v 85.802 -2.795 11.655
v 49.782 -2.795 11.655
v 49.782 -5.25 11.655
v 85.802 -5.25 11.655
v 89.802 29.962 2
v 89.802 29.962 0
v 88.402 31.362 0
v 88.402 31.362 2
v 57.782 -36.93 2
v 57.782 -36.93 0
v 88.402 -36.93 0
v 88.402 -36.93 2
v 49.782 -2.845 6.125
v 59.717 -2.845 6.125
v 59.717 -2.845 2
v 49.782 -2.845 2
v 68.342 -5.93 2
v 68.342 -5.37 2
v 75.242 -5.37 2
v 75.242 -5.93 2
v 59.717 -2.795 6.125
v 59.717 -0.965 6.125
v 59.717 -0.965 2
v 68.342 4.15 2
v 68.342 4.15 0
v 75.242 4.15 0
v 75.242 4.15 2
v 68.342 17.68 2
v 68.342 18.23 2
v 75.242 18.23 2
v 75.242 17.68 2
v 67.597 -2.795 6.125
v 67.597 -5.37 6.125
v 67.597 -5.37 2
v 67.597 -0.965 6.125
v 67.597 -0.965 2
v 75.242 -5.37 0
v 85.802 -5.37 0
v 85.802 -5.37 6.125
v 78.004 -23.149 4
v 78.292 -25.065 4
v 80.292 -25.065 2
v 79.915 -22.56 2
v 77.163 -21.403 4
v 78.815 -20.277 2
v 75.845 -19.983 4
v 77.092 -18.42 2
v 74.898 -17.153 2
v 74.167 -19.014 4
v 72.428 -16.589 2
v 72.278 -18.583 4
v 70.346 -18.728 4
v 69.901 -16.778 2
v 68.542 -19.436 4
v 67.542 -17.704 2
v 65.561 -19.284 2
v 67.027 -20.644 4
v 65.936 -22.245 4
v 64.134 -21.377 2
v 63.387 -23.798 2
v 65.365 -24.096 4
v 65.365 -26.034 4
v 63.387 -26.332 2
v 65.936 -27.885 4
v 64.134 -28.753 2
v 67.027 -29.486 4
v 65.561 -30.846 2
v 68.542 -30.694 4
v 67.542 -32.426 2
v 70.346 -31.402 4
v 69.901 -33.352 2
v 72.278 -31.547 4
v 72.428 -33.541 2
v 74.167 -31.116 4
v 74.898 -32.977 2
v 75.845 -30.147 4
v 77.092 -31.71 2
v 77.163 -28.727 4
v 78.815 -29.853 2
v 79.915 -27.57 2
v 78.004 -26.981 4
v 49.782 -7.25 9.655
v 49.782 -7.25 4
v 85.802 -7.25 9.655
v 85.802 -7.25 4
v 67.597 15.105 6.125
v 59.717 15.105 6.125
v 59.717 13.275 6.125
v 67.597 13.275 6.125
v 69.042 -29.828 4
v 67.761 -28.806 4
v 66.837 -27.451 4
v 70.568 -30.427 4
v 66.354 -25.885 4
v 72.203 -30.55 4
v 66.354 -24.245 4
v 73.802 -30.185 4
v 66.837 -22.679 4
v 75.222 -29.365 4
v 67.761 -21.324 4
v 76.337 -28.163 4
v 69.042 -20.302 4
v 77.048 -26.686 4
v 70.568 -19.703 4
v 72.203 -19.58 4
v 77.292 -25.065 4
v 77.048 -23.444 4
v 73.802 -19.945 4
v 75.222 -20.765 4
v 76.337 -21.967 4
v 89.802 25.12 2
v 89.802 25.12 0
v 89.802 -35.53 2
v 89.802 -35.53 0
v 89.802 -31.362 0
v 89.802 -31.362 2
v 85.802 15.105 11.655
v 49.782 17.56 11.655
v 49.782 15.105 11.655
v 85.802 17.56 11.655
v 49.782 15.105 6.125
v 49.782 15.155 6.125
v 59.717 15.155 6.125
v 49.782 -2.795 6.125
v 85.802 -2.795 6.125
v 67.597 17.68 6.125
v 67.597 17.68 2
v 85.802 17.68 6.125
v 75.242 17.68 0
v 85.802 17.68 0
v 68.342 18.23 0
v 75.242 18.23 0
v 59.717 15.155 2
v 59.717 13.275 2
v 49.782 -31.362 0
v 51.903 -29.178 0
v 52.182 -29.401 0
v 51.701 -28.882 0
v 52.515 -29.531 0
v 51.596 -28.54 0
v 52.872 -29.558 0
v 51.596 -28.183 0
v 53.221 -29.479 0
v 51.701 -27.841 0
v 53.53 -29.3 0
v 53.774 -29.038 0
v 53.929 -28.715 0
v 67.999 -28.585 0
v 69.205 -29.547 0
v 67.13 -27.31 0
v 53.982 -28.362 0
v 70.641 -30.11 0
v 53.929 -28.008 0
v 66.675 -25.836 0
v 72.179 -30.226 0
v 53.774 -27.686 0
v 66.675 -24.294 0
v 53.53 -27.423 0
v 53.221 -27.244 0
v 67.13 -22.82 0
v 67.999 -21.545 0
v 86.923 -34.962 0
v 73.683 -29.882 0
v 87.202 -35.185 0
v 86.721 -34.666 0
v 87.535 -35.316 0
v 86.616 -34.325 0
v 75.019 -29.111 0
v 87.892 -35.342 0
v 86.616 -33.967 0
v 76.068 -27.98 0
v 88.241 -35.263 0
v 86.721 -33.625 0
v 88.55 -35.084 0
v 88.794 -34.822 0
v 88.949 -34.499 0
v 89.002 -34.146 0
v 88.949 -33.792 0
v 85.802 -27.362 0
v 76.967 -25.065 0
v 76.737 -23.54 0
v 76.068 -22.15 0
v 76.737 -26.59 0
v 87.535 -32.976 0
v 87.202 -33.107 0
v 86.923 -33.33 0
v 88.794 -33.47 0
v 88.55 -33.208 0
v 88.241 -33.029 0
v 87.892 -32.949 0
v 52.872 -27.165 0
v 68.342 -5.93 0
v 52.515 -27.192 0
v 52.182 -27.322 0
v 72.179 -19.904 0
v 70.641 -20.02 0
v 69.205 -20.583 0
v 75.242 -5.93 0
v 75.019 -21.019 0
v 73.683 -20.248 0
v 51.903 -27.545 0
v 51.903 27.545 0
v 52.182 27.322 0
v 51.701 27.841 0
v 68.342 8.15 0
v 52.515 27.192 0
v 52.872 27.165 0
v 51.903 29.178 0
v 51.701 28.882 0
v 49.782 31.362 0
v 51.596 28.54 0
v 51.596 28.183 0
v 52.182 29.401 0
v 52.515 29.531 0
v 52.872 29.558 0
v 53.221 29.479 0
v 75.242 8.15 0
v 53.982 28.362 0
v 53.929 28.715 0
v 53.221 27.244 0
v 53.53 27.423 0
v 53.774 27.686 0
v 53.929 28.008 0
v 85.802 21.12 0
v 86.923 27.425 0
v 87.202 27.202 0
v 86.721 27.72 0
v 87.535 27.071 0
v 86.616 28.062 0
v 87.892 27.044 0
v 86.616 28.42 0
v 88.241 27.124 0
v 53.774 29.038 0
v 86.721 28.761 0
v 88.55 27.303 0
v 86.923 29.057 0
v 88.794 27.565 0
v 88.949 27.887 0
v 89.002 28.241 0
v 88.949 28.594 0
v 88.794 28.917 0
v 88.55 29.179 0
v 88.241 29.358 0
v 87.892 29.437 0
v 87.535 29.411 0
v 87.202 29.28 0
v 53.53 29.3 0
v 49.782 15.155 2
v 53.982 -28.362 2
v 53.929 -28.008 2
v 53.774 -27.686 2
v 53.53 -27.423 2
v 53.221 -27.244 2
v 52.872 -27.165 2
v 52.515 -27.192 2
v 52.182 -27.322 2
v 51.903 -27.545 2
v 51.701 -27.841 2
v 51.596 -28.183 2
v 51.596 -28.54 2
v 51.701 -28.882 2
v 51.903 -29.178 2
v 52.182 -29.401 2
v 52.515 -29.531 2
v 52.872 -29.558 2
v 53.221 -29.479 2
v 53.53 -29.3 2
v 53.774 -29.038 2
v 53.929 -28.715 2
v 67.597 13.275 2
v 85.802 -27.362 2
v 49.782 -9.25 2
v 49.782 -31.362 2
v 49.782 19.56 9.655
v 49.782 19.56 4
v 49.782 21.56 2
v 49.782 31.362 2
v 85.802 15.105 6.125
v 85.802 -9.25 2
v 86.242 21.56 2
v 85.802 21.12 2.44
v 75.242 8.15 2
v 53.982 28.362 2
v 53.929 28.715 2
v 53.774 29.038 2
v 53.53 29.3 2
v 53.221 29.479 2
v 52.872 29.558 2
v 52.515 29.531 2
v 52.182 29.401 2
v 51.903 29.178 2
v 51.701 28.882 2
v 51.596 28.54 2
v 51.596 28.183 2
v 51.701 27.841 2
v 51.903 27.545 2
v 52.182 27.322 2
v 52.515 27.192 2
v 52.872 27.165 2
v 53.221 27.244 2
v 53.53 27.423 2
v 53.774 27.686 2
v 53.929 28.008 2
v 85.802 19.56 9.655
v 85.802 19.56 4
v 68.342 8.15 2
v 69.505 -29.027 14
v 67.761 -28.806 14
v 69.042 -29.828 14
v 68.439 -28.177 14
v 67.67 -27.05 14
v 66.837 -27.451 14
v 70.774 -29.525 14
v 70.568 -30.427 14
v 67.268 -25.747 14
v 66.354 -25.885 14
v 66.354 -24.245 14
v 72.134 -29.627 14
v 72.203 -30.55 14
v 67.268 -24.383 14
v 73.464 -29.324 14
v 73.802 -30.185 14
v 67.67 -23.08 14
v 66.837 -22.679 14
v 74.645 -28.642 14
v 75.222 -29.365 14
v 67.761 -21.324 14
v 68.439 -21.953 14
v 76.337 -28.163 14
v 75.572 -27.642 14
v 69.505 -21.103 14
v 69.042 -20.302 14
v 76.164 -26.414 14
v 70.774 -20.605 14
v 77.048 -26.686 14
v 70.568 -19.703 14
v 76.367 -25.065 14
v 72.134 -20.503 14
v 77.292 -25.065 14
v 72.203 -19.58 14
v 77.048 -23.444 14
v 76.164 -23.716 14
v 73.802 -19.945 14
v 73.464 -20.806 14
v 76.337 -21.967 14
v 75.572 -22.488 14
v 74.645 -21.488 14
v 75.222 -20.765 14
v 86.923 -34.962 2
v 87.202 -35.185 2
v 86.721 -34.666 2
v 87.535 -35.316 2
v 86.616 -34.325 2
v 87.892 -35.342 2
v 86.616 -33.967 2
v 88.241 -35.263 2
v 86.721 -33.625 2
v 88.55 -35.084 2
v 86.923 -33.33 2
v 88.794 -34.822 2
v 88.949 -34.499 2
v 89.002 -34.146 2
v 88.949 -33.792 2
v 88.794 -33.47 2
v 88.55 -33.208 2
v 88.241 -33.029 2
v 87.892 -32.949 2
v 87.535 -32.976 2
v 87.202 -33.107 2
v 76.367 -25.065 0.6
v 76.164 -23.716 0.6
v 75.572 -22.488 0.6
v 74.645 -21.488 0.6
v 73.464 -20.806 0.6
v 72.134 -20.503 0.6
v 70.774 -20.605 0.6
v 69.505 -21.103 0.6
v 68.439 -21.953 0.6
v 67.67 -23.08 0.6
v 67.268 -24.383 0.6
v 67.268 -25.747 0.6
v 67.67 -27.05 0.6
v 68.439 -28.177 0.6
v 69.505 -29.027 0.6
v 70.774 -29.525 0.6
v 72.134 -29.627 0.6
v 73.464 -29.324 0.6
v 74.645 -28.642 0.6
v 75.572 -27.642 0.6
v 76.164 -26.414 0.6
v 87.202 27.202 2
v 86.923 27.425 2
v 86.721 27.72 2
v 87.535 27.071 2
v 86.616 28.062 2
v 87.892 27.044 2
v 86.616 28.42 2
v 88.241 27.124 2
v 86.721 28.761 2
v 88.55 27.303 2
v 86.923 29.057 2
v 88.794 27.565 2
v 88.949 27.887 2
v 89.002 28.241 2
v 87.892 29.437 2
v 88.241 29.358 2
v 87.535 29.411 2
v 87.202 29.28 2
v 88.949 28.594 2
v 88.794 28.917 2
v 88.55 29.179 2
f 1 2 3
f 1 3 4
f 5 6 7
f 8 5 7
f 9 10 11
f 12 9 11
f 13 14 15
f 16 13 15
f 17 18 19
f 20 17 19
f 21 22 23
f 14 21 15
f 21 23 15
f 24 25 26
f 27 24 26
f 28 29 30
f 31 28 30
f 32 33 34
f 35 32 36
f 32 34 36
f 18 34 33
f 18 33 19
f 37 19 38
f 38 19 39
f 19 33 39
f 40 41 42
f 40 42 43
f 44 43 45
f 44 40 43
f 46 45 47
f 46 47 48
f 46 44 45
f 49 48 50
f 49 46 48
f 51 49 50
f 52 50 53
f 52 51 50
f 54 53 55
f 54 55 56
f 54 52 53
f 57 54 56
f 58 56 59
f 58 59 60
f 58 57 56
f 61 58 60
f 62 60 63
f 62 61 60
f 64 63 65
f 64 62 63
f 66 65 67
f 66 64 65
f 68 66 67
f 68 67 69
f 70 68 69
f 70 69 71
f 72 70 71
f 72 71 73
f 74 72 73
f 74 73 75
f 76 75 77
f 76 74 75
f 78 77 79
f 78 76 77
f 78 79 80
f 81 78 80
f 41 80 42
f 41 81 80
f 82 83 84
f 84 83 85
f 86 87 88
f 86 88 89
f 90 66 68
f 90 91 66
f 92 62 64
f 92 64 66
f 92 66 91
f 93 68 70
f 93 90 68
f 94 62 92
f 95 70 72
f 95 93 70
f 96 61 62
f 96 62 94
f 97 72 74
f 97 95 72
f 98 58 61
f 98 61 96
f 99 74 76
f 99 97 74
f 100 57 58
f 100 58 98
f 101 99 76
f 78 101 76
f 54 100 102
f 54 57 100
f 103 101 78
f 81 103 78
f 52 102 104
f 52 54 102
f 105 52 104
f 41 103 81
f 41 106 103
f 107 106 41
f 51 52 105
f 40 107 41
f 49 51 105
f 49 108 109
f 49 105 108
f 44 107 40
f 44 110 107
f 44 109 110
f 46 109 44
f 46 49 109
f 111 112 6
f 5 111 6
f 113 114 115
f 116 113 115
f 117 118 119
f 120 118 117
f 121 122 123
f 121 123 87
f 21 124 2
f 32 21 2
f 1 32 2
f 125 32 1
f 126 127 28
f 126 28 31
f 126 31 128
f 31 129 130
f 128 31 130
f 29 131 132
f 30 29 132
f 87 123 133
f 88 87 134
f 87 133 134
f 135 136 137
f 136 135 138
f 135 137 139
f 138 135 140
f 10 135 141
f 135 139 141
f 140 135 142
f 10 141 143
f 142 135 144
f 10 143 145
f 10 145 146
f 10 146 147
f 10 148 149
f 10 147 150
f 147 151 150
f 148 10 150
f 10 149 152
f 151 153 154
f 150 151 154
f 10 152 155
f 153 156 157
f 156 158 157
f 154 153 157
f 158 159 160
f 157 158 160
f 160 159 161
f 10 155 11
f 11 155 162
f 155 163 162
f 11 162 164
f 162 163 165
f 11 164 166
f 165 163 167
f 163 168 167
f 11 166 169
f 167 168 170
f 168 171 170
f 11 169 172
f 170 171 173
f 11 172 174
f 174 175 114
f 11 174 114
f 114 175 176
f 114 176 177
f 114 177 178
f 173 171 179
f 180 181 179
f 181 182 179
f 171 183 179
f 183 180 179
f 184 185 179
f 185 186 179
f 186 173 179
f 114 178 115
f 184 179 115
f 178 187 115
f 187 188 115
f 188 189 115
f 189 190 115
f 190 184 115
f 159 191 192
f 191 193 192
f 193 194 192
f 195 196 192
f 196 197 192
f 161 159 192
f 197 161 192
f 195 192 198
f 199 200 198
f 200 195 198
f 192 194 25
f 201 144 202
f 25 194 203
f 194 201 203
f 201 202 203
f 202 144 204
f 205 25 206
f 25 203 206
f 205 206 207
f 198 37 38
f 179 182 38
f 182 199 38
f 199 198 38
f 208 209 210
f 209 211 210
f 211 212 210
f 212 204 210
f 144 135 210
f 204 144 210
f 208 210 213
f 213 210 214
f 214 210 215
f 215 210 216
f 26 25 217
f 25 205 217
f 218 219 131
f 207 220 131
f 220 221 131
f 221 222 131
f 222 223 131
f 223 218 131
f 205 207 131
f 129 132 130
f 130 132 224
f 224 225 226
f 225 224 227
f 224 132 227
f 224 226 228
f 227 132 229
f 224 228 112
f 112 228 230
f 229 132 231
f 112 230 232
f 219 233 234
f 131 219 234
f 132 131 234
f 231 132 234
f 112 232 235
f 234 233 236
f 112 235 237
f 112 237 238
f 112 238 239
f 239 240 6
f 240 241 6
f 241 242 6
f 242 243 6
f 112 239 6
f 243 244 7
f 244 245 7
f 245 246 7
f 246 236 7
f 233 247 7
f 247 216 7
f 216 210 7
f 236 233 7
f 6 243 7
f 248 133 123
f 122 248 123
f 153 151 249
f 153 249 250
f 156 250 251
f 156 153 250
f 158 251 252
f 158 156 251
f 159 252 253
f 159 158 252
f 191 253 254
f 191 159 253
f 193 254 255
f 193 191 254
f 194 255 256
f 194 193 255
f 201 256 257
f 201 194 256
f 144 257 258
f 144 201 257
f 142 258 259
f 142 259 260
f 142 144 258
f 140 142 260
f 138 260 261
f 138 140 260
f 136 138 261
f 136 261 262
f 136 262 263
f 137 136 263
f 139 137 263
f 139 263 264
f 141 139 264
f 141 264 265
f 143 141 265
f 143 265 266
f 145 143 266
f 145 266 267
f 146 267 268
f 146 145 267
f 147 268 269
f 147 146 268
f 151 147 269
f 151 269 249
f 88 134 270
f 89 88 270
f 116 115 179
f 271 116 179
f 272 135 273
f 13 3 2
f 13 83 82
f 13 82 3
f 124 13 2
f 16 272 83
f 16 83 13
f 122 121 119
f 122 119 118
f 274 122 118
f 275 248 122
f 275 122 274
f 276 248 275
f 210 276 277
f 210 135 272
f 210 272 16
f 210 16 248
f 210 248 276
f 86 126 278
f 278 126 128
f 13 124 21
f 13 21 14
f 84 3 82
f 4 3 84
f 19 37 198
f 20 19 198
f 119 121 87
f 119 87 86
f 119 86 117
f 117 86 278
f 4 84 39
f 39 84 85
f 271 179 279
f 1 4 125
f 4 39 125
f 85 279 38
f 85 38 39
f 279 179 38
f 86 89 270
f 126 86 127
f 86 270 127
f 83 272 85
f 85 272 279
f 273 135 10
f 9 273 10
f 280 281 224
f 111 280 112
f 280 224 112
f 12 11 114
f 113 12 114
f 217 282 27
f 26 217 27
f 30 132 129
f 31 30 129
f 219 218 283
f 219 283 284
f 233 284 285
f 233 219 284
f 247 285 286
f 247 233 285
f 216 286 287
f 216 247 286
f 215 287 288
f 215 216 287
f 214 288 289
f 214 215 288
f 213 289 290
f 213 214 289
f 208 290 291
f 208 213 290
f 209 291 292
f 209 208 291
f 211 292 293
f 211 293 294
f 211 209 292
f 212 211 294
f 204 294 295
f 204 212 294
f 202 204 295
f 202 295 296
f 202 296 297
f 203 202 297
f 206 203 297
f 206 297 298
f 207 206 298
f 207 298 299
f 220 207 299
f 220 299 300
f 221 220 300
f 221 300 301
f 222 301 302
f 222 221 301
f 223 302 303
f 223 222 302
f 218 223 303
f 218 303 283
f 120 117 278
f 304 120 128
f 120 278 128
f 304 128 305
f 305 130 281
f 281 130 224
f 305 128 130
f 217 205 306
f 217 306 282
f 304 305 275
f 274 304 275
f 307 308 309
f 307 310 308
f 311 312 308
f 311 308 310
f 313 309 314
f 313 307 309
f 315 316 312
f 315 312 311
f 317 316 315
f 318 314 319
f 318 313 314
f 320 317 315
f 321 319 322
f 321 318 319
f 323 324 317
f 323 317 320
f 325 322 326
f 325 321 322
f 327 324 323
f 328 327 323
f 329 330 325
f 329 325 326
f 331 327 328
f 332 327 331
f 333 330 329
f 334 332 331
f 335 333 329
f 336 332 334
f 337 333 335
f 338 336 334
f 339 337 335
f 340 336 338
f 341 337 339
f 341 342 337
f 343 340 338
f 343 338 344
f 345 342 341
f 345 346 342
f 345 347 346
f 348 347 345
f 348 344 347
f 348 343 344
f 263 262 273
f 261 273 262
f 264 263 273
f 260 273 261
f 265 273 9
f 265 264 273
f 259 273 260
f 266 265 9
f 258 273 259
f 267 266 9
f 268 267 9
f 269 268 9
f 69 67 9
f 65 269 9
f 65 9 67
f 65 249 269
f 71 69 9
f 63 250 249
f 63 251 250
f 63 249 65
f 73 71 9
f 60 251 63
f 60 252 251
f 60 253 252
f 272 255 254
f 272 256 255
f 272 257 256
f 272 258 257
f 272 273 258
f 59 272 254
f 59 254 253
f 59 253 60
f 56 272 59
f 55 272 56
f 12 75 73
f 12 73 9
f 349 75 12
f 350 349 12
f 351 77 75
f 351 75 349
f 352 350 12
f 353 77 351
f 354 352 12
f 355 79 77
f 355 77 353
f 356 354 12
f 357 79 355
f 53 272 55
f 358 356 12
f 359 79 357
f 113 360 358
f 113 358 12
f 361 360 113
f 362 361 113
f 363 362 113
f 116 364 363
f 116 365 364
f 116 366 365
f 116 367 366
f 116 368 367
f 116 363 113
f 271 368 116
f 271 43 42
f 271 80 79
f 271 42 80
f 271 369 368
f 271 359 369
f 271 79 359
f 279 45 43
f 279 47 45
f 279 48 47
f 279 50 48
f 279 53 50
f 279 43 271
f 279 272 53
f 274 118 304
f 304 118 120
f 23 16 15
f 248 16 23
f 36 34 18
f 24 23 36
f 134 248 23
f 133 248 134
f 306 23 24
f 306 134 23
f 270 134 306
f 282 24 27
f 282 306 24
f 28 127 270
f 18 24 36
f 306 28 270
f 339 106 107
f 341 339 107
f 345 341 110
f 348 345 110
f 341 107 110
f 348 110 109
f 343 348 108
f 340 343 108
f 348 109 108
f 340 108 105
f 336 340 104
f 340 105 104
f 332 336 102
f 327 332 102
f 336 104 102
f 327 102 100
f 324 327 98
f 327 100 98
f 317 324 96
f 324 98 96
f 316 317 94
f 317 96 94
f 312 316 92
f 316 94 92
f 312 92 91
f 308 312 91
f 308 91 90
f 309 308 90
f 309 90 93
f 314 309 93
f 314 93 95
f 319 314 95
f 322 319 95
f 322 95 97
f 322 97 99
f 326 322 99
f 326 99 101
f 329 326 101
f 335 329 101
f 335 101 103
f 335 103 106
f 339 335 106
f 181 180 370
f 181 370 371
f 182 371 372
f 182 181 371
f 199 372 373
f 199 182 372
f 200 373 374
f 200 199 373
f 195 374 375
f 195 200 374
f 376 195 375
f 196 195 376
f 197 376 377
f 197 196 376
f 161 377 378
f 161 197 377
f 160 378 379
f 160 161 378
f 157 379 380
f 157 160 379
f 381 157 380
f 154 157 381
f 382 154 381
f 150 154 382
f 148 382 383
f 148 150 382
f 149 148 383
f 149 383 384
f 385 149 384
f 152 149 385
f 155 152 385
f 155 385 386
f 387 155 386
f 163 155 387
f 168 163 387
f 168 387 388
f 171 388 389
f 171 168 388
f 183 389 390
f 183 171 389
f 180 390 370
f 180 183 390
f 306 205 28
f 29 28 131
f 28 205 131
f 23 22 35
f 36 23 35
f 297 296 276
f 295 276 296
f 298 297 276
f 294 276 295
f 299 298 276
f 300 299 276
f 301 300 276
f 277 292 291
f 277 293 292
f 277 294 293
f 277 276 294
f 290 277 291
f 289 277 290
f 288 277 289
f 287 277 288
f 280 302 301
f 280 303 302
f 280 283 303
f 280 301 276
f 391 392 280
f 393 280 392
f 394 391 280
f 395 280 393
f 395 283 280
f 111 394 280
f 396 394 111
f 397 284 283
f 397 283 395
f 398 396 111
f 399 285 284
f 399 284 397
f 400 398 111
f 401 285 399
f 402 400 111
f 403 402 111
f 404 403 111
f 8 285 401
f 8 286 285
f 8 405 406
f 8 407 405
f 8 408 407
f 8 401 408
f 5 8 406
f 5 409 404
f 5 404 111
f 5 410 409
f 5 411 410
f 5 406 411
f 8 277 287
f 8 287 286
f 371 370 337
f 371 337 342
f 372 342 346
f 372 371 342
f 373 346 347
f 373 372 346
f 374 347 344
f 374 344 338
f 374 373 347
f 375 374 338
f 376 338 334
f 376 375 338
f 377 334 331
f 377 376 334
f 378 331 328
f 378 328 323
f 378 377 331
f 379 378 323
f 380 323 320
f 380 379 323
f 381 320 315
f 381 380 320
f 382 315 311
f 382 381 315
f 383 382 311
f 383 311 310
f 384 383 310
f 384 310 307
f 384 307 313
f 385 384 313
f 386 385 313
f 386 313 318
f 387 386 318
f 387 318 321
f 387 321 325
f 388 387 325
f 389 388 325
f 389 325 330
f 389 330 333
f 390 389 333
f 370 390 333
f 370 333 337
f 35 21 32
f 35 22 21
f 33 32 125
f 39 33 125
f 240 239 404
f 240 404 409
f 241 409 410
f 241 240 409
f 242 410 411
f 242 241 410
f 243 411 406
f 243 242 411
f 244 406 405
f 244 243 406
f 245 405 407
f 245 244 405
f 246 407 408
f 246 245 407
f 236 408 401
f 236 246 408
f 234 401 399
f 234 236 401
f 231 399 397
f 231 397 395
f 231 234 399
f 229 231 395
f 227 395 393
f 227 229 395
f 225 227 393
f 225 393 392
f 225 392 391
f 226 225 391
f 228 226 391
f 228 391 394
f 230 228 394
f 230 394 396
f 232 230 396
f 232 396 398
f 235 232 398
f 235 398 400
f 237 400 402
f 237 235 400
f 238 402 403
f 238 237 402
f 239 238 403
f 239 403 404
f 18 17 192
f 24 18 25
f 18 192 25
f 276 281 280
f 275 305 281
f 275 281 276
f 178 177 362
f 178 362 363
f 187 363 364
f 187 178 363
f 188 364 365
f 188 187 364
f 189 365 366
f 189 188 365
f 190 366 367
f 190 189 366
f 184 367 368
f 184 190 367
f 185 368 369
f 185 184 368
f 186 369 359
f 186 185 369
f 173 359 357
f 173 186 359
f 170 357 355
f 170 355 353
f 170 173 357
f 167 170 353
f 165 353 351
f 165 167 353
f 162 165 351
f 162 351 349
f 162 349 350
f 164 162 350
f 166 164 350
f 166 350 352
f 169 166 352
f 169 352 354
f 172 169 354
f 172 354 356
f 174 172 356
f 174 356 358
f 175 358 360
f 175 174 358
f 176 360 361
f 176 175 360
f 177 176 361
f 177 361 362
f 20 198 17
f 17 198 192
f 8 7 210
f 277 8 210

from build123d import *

# Parameters (mm, degrees)
SKETCH_1_R          = 4.575
SKETCH_1_W          = 6.9
SKETCH_1_H          = 10.08
SKETCH_1_R_2        = 1.2
EXTRUDE_1_DEPTH     = 2
EXTRUDE_2_DEPTH     = 4.125036756
SKETCH_3_W          = 1.88
SKETCH_3_H          = 14.24
CUT_EXTRUDE_1_DEPTH = 4.125036756
SKETCH_4_W          = 6.9
SKETCH_4_H          = 0.56
SKETCH_4_H_2        = 0.55
EXTRUDE_3_DEPTH     = 4.125036756
SKETCH_5_W          = 0.215
SKETCH_5_H          = 23.05
CUT_EXTRUDE_2_DEPTH = 4.125036756
SKETCH_6_W          = 0.745
SKETCH_6_H          = 2.575
SKETCH_6_W_2        = 6.9
EXTRUDE_4_DEPTH     = 2
SKETCH_7_R          = 5.5
SKETCH_7_R_2        = 4.575
EXTRUDE_5_DEPTH     = 12
CHAMFER_1_SIZE      = 0.6
SKETCH_8_R          = 6.5
SKETCH_8_R_2        = 5.5
EXTRUDE_6_DEPTH     = 2
EXTRUDE_7_DEPTH     = 15.935
SKETCH_10_W         = 36.02
SKETCH_10_H         = 4.455
EXTRUDE_8_DEPTH     = 3.53
CHAMFER_3_SIZE      = 2
CHAMFER_4_SIZE      = 2
CUT_EXTRUDE_4_DEPTH = 10


with BuildPart() as part:
    # 草图1 → 凸台-拉伸1 (new body)
    # profile 1 of 2: a face of its own
    with BuildSketch(Plane.XY):
        Polygon((83.862310964, 7.15), (85.802310964, 7.15), (85.802310964, 13.83), (83.862310964, 13.83), (83.862310964, 25.12), (77.212310964, 25.12), (77.212310964, 30), (66.372310964, 30), (66.372310964, 25.12), (59.662310964, 25.12), (59.662310964, 25.076338502), (59.782310964, 25), (59.782310964, -34.93), (83.862310964, -34.93), align=None)
        with Locations((71.792310964, -25.065)):
            Circle(SKETCH_1_R, mode=Mode.SUBTRACT)
        with Locations((71.792310964, -0.89)):
            Rectangle(SKETCH_1_W, SKETCH_1_H, mode=Mode.SUBTRACT)
        with Locations((71.792310964, 13.19)):
            Rectangle(SKETCH_1_W, SKETCH_1_H, mode=Mode.SUBTRACT)
    # profile 2 of 2: a face of its own
    with BuildSketch(Plane.XY):
        Polygon((85.802310964, -27.361541817), (85.802310964, 7.15), (83.862310964, 7.15), (83.862310964, -34.93), (59.782310964, -34.93), (59.782310964, 25), (59.662310964, 25.076338502), (59.662310964, 25.12), (66.372310964, 25.12), (66.372310964, 30), (77.212310964, 30), (77.212310964, 25.12), (83.862310964, 25.12), (83.862310964, 13.83), (85.802310964, 13.83), (85.802310964, 21.12), (89.802310964, 25.12), (89.802310964, 29.961541817), (88.402310964, 31.361541817), (49.782310964, 31.361541817), (49.782310964, -31.361541817), (57.782310964, -36.93), (88.402310964, -36.93), (89.802310964, -35.53), (89.802310964, -31.361541817), align=None)
        with Locations((52.782310964, -28.361541817)):
            Circle(SKETCH_1_R_2, mode=Mode.SUBTRACT)
        with Locations((87.802310964, -34.145770908)):
            Circle(SKETCH_1_R_2, mode=Mode.SUBTRACT)
        with Locations((52.782310964, 28.361541817)):
            Circle(SKETCH_1_R_2, mode=Mode.SUBTRACT)
        with Locations((87.802310964, 28.240770908)):
            Circle(SKETCH_1_R_2, mode=Mode.SUBTRACT)
    extrude(amount=EXTRUDE_1_DEPTH)

    # 草图2 → 凸台-拉伸2 (add)
    with BuildSketch(Plane.XY.offset(2)):
        Polygon((79.187310964, 17.68), (79.187310964, 19.56), (65.717310964, 19.56), (65.717310964, 15.155), (59.717310964, 15.155), (59.717310964, -2.845), (65.717310964, -2.845), (65.717310964, -7.25), (79.187310964, -7.25), (79.187310964, -5.37), (75.242310964, -5.37), (75.242310964, -5.93), (68.342310964, -5.93), (68.342310964, -5.37), (67.597310964, -5.37), (67.597310964, -0.965), (61.597310964, -0.965), (61.597310964, 13.275), (67.597310964, 13.275), (67.597310964, 17.68), (68.342310964, 17.68), (68.342310964, 18.23), (75.242310964, 18.23), (75.242310964, 17.68), align=None)
        Polygon((83.187310964, 17.68), (83.187310964, 19.56), (79.187310964, 19.56), (79.187310964, 17.68), (81.067310964, 17.68), (81.307310964, 17.68), align=None)
        Polygon((85.802310964, 19.56), (83.187310964, 19.56), (83.187310964, 17.68), (85.587310964, 17.68), (85.587310964, -5.37), (83.187310964, -5.37), (83.187310964, -7.25), (85.802310964, -7.25), align=None)
        Polygon((79.187310964, -7.25), (83.187310964, -7.25), (83.187310964, -5.37), (81.307310964, -5.37), (81.067310964, -5.37), (79.187310964, -5.37), align=None)
    extrude(amount=EXTRUDE_2_DEPTH)

    # 草图3 → 切除-拉伸1 (cut)
    with BuildSketch(Plane.XY.offset(6.125036756)):
        with Locations((60.657310964, 6.155)):
            Rectangle(SKETCH_3_W, SKETCH_3_H)
    extrude(amount=-CUT_EXTRUDE_1_DEPTH, mode=Mode.SUBTRACT)

    # 草图4 → 凸台-拉伸3 (add)
    with BuildSketch(Plane.XY.offset(6.125036756)):
        with Locations((71.792310964, -5.65)):
            Rectangle(SKETCH_4_W, SKETCH_4_H)
        with Locations((71.792310964, 17.955)):
            Rectangle(SKETCH_4_W, SKETCH_4_H_2)
    extrude(amount=-EXTRUDE_3_DEPTH)

    # 草图5 → 切除-拉伸2 (cut)
    with BuildSketch(Plane.XY.offset(6.125036756)):
        with Locations((85.694810964, 6.155)):
            Rectangle(SKETCH_5_W, SKETCH_5_H)
    extrude(amount=-CUT_EXTRUDE_2_DEPTH, mode=Mode.SUBTRACT)

    # 草图6 → 凸台-拉伸4 (add)
    with BuildSketch(Plane.XY.offset(6.125036756)):
        Polygon((67.597310964, -5.37), (67.597310964, -2.795), (65.717310964, -2.795), (65.717310964, -2.845), (65.717310964, -7.25), (67.597310964, -7.25), align=None)
        Polygon((85.802310964, -5.37), (75.242310964, -5.37), (68.342310964, -5.37), (67.597310964, -5.37), (67.597310964, -7.25), (85.802310964, -7.25), align=None)
        with Locations((67.969810964, -4.0825)):
            Rectangle(SKETCH_6_W, SKETCH_6_H)
        with Locations((71.792310964, -4.0825)):
            Rectangle(SKETCH_6_W_2, SKETCH_6_H)
        Polygon((85.467310964, -2.795), (81.187310964, -2.795), (75.242310964, -2.795), (75.242310964, -5.37), (85.802310964, -5.37), (85.802310964, -2.795), align=None)
        Polygon((65.717310964, 15.105), (67.597310964, 15.105), (67.597310964, 17.68), (67.597310964, 19.56), (65.717310964, 19.56), (65.717310964, 15.155), align=None)
        Polygon((68.342310964, 17.68), (75.242310964, 17.68), (85.802310964, 17.68), (85.802310964, 19.56), (67.597310964, 19.56), (67.597310964, 17.68), align=None)
        with Locations((67.969810964, 16.3925)):
            Rectangle(SKETCH_6_W, SKETCH_6_H)
        with Locations((71.792310964, 16.3925)):
            Rectangle(SKETCH_6_W_2, SKETCH_6_H)
        Polygon((75.242310964, 15.105), (81.187310964, 15.105), (85.467310964, 15.105), (85.802310964, 15.105), (85.802310964, 17.68), (75.242310964, 17.68), align=None)
    extrude(amount=EXTRUDE_4_DEPTH)

    # 草图7 → 凸台-拉伸5 (add)
    with BuildSketch(Plane.XY.offset(2)):
        with Locations((71.792310964, -25.065)):
            Circle(SKETCH_7_R)
        with Locations((71.792310964, -25.065)):
            Circle(SKETCH_7_R_2, mode=Mode.SUBTRACT)
    extrude(amount=EXTRUDE_5_DEPTH)

    # 倒角1
    chamfer_1_edges = [part.edges().sort_by_distance(p)[0] for p in [
        (67.217310964, -25.065, 0),
    ]]
    chamfer(chamfer_1_edges, length=CHAMFER_1_SIZE)

    # 草图8 → 凸台-拉伸6 (add)
    with BuildSketch(Plane.XY.offset(2)):
        with Locations((71.792310964, -25.065)):
            Circle(SKETCH_8_R)
        with Locations((71.792310964, -25.065)):
            Circle(SKETCH_8_R_2, mode=Mode.SUBTRACT)
    extrude(amount=EXTRUDE_6_DEPTH)

    # 草图9 → 凸台-拉伸7 (add)
    with BuildSketch(Plane.ZY.offset(-65.717310964)):
        Polygon((2, -7.25), (8.125036756, -7.25), (8.125036756, -2.795), (6.125036756, -2.795), (6.125036756, -2.845), (2, -2.845), align=None)
        Polygon((2, 15.155), (6.125036756, 15.155), (6.125036756, 15.105), (8.125036756, 15.105), (8.125036756, 19.56), (2, 19.56), align=None)
    extrude(amount=EXTRUDE_7_DEPTH)

    # 草图10 → 凸台-拉伸8 (add)
    with BuildSketch(Plane.XY.offset(8.125036756)):
        with Locations((67.792310964, -5.0225)):
            Rectangle(SKETCH_10_W, SKETCH_10_H)
        with Locations((67.792310964, 17.3325)):
            Rectangle(SKETCH_10_W, SKETCH_10_H)
    extrude(amount=EXTRUDE_8_DEPTH)

    # 倒角3
    chamfer_3_edges = [part.edges().sort_by_distance(p)[0] for p in [
        (67.792310964, 19.56, 11.655036756),
        (67.792310964, -7.25, 11.655036756),
        (67.792310964, 19.56, 2),
        (67.792310964, -7.25, 2),
    ]]
    chamfer(chamfer_3_edges, length=CHAMFER_3_SIZE)

    # 倒角4
    chamfer_4_edges = [part.edges().sort_by_distance(p)[0] for p in [
        (65.292310964, -25.065, 2),
    ]]
    chamfer(chamfer_4_edges, length=CHAMFER_4_SIZE - 0.0001)  # a hair under: the kernel refuses the full size

    # 草图12 → 切除-拉伸4 (cut)
    with BuildSketch(Plane.XY.offset(2)):
        Polygon((75.242310964, 8.15), (75.242310964, 4.15), (75.242310964, -5.37), (85.802310964, -5.37), (85.802310964, 17.68), (75.242310964, 17.68), align=None)
    extrude(amount=-CUT_EXTRUDE_4_DEPTH, mode=Mode.SUBTRACT)


solid = part.part
